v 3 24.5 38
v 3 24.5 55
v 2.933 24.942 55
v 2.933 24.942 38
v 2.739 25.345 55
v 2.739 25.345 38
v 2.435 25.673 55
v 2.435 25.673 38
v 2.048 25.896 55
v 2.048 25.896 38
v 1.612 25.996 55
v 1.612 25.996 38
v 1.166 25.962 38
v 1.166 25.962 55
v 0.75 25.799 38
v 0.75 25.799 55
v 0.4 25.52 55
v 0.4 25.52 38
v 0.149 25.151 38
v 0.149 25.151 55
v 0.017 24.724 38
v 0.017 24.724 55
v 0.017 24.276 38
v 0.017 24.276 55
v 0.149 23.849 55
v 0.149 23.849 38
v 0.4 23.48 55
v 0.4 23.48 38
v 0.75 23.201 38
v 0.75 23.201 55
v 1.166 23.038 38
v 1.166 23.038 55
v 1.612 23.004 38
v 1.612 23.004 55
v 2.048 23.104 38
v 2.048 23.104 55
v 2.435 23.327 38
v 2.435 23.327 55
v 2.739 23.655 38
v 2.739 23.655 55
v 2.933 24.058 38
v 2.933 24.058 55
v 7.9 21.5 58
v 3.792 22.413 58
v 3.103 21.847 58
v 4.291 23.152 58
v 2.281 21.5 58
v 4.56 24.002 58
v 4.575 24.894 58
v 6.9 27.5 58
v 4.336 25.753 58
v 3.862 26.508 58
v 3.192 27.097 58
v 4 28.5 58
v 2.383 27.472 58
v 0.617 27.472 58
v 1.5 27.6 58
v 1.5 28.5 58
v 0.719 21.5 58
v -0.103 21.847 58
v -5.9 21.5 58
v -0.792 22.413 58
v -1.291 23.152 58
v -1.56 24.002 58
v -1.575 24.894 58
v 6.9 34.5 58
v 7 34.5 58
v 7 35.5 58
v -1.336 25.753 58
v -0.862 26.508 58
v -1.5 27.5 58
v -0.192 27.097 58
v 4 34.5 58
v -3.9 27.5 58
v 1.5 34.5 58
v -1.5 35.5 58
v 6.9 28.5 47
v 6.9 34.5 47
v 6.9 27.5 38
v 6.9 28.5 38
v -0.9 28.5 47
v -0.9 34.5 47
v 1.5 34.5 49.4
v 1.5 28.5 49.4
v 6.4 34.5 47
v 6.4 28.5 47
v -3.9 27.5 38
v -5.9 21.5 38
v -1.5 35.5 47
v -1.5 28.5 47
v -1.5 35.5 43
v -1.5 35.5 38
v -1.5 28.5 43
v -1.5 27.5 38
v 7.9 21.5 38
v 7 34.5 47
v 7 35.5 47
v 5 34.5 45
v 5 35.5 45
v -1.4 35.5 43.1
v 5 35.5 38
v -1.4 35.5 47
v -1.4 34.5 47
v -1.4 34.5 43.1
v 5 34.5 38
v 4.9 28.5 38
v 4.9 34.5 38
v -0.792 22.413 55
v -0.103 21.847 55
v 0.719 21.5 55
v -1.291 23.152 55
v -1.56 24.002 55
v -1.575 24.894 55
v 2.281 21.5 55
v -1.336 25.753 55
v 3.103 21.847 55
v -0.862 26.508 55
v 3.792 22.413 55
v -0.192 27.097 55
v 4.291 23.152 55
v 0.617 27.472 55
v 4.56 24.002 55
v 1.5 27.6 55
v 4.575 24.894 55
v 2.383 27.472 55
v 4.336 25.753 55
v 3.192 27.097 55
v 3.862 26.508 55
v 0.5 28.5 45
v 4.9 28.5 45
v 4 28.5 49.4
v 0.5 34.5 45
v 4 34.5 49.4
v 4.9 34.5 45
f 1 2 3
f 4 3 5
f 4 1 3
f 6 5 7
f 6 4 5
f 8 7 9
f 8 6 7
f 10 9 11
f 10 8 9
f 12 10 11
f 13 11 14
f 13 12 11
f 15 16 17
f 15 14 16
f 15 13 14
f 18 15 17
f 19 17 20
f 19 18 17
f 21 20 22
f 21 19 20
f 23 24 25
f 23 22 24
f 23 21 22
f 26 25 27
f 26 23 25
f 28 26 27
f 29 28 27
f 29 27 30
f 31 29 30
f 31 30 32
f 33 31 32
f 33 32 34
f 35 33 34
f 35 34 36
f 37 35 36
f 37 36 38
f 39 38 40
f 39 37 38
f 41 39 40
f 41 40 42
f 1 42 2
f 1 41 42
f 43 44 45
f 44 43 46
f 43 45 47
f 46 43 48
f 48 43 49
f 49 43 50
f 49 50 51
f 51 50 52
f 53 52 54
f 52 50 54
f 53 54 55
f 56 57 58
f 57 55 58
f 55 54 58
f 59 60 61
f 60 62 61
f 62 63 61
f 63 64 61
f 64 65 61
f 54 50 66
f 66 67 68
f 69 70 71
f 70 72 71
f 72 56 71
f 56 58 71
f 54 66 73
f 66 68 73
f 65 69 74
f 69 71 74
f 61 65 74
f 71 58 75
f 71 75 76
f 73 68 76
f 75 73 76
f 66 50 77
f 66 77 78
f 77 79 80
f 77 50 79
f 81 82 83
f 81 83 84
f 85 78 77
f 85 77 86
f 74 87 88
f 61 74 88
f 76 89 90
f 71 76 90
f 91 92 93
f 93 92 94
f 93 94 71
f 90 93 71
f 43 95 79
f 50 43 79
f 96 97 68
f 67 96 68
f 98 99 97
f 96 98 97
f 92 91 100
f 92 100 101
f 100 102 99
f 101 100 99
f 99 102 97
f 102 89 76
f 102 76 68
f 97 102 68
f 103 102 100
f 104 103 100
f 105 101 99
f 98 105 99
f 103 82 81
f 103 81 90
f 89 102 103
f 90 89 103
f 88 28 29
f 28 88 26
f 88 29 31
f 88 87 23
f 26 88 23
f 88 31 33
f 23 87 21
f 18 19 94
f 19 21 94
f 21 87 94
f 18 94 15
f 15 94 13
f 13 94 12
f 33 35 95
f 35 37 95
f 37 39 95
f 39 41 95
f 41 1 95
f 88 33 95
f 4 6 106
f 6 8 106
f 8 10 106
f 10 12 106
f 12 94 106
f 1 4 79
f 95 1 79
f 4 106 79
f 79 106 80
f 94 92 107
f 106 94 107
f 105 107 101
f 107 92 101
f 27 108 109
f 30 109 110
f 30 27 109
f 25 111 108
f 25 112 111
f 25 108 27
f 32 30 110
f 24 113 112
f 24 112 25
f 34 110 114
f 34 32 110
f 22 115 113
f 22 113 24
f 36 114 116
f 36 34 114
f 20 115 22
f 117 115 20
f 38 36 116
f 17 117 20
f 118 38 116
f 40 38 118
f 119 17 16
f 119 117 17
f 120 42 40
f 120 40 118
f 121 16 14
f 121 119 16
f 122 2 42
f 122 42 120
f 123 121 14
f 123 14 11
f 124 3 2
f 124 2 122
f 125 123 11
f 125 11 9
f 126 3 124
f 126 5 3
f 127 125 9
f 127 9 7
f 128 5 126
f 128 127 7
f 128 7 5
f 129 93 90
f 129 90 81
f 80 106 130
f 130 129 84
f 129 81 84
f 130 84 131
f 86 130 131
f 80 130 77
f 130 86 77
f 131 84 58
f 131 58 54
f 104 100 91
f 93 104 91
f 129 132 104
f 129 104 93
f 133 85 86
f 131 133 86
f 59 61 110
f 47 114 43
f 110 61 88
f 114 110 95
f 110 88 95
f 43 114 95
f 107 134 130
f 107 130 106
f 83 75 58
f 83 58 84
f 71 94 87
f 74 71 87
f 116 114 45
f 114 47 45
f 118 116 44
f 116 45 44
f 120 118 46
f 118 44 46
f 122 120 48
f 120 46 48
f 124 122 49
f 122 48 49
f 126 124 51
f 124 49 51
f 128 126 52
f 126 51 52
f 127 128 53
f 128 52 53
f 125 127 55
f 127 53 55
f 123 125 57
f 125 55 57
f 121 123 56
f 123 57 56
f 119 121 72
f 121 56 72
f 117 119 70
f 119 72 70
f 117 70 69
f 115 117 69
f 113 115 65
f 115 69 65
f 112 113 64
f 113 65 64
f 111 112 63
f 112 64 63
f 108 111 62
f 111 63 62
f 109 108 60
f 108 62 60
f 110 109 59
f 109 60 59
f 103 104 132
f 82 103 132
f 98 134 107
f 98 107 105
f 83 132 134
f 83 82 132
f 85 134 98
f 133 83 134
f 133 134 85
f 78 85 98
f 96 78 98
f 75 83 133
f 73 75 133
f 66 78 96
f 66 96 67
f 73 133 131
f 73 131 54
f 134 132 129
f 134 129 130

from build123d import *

# Parameters (mm, degrees)
SKETCH042_R     = 1.5
PAD016_DEPTH    = 20
SKETCH043_R     = 3.1
POCKET016_DEPTH = 3
POCKET017_DEPTH = 7
CHAMFER010_SIZE = 2.4
CHAMFER011_SIZE = 2
PAD018_DEPTH    = 1


with BuildPart() as part:
    # Sketch042 → Pad016 (new body)
    with BuildSketch(Plane.XY):
        Polygon((-5.9, 0), (7.9, 0), (6.9, 6), (6.9, 14), (-1.5, 14), (-1.5, 6), (-3.9, 6), align=None)
        with Locations((1.5, 3)):
            Circle(SKETCH042_R, mode=Mode.SUBTRACT)
    extrude(amount=PAD016_DEPTH)

    # Sketch043 (on Face10 of Pad016) → Pocket016 (cut)
    with BuildSketch(Plane.XY.offset(20)):
        with Locations((1.5, 3)):
            Circle(SKETCH043_R)
    extrude(amount=-POCKET016_DEPTH, mode=Mode.SUBTRACT)

    # Sketch044 (on Face10 of Pocket016) → Pocket017 (cut)
    with BuildSketch(Plane(origin=(0, 14, 0), x_dir=(-1, 0, 0), z_dir=(0, 1, 0))):
        Polygon((-4, 20), (-1.5, 20), (-1.5, 9), (1.5, 9), (1.5, 7), (-4.9, 7), (-4.9, 0), (-6.9, 0), (-6.9, 9), (-4, 9), align=None)
    extrude(amount=-POCKET017_DEPTH, mode=Mode.SUBTRACT)

    # Chamfer010
    chamfer010_edges = [part.edges().sort_by_distance(p)[0] for p in [
        (4, 10.5, 9),
        (1.5, 10.5, 9),
    ]]
    chamfer(chamfer010_edges, length=CHAMFER010_SIZE)

    # Chamfer011
    chamfer011_edges = [part.edges().sort_by_distance(p)[0] for p in [
        (-1.5, 10.5, 7),
    ]]
    chamfer(chamfer011_edges, length=CHAMFER011_SIZE)

    # Sketch046 (on Face17 of Chamfer011) → Pad018 (join)
    with BuildSketch(Plane(origin=(0, 14, 0), x_dir=(-1, 0, 0), z_dir=(0, 1, 0))):
        Polygon((-7, 20), (1.4, 20), (1.4, 0), (-5, 0), (-5, 7), (-7, 9), align=None)
    extrude(amount=-PAD018_DEPTH)


with BuildPart() as part_1:
    # Body008 placement: moved
    add(part.part.moved(Location((0, 21.5, 38))))


solid = part_1.part
